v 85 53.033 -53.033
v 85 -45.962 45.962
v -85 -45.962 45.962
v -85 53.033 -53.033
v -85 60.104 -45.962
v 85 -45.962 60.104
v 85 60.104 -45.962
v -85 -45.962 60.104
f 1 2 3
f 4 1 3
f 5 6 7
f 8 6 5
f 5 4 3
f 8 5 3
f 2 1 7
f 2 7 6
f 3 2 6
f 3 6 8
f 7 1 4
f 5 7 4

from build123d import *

# Parameters (mm, degrees)
F1_W     = 170
F1_H     = 150
F2_DEPTH = 10
F3_SIZE  = 9.99999


# Not quite as in the source:
# - a fillet or chamfer is up to 0.001 mm smaller than in the source, because OpenCascade refuses the exact size


with BuildPart() as f2:
    # F1 (on face) → F2 (new body)
    with BuildSketch(Plane(origin=(0, 0, 0), x_dir=(-1, 0, 0), z_dir=(0, 0.7071067812, 0.7071067812))):
        Rectangle(F1_W, F1_H)
    extrude(amount=F2_DEPTH)

    # F3 (size 10 in the source; OpenCascade refuses exactly that, so slightly less here)
    f3_edges = [f2.edges().sort_by_distance(p)[0] for p in [
        (0, -53.033009, 53.033009),
    ]]
    chamfer(f3_edges, length=F3_SIZE)


solid = f2.part
